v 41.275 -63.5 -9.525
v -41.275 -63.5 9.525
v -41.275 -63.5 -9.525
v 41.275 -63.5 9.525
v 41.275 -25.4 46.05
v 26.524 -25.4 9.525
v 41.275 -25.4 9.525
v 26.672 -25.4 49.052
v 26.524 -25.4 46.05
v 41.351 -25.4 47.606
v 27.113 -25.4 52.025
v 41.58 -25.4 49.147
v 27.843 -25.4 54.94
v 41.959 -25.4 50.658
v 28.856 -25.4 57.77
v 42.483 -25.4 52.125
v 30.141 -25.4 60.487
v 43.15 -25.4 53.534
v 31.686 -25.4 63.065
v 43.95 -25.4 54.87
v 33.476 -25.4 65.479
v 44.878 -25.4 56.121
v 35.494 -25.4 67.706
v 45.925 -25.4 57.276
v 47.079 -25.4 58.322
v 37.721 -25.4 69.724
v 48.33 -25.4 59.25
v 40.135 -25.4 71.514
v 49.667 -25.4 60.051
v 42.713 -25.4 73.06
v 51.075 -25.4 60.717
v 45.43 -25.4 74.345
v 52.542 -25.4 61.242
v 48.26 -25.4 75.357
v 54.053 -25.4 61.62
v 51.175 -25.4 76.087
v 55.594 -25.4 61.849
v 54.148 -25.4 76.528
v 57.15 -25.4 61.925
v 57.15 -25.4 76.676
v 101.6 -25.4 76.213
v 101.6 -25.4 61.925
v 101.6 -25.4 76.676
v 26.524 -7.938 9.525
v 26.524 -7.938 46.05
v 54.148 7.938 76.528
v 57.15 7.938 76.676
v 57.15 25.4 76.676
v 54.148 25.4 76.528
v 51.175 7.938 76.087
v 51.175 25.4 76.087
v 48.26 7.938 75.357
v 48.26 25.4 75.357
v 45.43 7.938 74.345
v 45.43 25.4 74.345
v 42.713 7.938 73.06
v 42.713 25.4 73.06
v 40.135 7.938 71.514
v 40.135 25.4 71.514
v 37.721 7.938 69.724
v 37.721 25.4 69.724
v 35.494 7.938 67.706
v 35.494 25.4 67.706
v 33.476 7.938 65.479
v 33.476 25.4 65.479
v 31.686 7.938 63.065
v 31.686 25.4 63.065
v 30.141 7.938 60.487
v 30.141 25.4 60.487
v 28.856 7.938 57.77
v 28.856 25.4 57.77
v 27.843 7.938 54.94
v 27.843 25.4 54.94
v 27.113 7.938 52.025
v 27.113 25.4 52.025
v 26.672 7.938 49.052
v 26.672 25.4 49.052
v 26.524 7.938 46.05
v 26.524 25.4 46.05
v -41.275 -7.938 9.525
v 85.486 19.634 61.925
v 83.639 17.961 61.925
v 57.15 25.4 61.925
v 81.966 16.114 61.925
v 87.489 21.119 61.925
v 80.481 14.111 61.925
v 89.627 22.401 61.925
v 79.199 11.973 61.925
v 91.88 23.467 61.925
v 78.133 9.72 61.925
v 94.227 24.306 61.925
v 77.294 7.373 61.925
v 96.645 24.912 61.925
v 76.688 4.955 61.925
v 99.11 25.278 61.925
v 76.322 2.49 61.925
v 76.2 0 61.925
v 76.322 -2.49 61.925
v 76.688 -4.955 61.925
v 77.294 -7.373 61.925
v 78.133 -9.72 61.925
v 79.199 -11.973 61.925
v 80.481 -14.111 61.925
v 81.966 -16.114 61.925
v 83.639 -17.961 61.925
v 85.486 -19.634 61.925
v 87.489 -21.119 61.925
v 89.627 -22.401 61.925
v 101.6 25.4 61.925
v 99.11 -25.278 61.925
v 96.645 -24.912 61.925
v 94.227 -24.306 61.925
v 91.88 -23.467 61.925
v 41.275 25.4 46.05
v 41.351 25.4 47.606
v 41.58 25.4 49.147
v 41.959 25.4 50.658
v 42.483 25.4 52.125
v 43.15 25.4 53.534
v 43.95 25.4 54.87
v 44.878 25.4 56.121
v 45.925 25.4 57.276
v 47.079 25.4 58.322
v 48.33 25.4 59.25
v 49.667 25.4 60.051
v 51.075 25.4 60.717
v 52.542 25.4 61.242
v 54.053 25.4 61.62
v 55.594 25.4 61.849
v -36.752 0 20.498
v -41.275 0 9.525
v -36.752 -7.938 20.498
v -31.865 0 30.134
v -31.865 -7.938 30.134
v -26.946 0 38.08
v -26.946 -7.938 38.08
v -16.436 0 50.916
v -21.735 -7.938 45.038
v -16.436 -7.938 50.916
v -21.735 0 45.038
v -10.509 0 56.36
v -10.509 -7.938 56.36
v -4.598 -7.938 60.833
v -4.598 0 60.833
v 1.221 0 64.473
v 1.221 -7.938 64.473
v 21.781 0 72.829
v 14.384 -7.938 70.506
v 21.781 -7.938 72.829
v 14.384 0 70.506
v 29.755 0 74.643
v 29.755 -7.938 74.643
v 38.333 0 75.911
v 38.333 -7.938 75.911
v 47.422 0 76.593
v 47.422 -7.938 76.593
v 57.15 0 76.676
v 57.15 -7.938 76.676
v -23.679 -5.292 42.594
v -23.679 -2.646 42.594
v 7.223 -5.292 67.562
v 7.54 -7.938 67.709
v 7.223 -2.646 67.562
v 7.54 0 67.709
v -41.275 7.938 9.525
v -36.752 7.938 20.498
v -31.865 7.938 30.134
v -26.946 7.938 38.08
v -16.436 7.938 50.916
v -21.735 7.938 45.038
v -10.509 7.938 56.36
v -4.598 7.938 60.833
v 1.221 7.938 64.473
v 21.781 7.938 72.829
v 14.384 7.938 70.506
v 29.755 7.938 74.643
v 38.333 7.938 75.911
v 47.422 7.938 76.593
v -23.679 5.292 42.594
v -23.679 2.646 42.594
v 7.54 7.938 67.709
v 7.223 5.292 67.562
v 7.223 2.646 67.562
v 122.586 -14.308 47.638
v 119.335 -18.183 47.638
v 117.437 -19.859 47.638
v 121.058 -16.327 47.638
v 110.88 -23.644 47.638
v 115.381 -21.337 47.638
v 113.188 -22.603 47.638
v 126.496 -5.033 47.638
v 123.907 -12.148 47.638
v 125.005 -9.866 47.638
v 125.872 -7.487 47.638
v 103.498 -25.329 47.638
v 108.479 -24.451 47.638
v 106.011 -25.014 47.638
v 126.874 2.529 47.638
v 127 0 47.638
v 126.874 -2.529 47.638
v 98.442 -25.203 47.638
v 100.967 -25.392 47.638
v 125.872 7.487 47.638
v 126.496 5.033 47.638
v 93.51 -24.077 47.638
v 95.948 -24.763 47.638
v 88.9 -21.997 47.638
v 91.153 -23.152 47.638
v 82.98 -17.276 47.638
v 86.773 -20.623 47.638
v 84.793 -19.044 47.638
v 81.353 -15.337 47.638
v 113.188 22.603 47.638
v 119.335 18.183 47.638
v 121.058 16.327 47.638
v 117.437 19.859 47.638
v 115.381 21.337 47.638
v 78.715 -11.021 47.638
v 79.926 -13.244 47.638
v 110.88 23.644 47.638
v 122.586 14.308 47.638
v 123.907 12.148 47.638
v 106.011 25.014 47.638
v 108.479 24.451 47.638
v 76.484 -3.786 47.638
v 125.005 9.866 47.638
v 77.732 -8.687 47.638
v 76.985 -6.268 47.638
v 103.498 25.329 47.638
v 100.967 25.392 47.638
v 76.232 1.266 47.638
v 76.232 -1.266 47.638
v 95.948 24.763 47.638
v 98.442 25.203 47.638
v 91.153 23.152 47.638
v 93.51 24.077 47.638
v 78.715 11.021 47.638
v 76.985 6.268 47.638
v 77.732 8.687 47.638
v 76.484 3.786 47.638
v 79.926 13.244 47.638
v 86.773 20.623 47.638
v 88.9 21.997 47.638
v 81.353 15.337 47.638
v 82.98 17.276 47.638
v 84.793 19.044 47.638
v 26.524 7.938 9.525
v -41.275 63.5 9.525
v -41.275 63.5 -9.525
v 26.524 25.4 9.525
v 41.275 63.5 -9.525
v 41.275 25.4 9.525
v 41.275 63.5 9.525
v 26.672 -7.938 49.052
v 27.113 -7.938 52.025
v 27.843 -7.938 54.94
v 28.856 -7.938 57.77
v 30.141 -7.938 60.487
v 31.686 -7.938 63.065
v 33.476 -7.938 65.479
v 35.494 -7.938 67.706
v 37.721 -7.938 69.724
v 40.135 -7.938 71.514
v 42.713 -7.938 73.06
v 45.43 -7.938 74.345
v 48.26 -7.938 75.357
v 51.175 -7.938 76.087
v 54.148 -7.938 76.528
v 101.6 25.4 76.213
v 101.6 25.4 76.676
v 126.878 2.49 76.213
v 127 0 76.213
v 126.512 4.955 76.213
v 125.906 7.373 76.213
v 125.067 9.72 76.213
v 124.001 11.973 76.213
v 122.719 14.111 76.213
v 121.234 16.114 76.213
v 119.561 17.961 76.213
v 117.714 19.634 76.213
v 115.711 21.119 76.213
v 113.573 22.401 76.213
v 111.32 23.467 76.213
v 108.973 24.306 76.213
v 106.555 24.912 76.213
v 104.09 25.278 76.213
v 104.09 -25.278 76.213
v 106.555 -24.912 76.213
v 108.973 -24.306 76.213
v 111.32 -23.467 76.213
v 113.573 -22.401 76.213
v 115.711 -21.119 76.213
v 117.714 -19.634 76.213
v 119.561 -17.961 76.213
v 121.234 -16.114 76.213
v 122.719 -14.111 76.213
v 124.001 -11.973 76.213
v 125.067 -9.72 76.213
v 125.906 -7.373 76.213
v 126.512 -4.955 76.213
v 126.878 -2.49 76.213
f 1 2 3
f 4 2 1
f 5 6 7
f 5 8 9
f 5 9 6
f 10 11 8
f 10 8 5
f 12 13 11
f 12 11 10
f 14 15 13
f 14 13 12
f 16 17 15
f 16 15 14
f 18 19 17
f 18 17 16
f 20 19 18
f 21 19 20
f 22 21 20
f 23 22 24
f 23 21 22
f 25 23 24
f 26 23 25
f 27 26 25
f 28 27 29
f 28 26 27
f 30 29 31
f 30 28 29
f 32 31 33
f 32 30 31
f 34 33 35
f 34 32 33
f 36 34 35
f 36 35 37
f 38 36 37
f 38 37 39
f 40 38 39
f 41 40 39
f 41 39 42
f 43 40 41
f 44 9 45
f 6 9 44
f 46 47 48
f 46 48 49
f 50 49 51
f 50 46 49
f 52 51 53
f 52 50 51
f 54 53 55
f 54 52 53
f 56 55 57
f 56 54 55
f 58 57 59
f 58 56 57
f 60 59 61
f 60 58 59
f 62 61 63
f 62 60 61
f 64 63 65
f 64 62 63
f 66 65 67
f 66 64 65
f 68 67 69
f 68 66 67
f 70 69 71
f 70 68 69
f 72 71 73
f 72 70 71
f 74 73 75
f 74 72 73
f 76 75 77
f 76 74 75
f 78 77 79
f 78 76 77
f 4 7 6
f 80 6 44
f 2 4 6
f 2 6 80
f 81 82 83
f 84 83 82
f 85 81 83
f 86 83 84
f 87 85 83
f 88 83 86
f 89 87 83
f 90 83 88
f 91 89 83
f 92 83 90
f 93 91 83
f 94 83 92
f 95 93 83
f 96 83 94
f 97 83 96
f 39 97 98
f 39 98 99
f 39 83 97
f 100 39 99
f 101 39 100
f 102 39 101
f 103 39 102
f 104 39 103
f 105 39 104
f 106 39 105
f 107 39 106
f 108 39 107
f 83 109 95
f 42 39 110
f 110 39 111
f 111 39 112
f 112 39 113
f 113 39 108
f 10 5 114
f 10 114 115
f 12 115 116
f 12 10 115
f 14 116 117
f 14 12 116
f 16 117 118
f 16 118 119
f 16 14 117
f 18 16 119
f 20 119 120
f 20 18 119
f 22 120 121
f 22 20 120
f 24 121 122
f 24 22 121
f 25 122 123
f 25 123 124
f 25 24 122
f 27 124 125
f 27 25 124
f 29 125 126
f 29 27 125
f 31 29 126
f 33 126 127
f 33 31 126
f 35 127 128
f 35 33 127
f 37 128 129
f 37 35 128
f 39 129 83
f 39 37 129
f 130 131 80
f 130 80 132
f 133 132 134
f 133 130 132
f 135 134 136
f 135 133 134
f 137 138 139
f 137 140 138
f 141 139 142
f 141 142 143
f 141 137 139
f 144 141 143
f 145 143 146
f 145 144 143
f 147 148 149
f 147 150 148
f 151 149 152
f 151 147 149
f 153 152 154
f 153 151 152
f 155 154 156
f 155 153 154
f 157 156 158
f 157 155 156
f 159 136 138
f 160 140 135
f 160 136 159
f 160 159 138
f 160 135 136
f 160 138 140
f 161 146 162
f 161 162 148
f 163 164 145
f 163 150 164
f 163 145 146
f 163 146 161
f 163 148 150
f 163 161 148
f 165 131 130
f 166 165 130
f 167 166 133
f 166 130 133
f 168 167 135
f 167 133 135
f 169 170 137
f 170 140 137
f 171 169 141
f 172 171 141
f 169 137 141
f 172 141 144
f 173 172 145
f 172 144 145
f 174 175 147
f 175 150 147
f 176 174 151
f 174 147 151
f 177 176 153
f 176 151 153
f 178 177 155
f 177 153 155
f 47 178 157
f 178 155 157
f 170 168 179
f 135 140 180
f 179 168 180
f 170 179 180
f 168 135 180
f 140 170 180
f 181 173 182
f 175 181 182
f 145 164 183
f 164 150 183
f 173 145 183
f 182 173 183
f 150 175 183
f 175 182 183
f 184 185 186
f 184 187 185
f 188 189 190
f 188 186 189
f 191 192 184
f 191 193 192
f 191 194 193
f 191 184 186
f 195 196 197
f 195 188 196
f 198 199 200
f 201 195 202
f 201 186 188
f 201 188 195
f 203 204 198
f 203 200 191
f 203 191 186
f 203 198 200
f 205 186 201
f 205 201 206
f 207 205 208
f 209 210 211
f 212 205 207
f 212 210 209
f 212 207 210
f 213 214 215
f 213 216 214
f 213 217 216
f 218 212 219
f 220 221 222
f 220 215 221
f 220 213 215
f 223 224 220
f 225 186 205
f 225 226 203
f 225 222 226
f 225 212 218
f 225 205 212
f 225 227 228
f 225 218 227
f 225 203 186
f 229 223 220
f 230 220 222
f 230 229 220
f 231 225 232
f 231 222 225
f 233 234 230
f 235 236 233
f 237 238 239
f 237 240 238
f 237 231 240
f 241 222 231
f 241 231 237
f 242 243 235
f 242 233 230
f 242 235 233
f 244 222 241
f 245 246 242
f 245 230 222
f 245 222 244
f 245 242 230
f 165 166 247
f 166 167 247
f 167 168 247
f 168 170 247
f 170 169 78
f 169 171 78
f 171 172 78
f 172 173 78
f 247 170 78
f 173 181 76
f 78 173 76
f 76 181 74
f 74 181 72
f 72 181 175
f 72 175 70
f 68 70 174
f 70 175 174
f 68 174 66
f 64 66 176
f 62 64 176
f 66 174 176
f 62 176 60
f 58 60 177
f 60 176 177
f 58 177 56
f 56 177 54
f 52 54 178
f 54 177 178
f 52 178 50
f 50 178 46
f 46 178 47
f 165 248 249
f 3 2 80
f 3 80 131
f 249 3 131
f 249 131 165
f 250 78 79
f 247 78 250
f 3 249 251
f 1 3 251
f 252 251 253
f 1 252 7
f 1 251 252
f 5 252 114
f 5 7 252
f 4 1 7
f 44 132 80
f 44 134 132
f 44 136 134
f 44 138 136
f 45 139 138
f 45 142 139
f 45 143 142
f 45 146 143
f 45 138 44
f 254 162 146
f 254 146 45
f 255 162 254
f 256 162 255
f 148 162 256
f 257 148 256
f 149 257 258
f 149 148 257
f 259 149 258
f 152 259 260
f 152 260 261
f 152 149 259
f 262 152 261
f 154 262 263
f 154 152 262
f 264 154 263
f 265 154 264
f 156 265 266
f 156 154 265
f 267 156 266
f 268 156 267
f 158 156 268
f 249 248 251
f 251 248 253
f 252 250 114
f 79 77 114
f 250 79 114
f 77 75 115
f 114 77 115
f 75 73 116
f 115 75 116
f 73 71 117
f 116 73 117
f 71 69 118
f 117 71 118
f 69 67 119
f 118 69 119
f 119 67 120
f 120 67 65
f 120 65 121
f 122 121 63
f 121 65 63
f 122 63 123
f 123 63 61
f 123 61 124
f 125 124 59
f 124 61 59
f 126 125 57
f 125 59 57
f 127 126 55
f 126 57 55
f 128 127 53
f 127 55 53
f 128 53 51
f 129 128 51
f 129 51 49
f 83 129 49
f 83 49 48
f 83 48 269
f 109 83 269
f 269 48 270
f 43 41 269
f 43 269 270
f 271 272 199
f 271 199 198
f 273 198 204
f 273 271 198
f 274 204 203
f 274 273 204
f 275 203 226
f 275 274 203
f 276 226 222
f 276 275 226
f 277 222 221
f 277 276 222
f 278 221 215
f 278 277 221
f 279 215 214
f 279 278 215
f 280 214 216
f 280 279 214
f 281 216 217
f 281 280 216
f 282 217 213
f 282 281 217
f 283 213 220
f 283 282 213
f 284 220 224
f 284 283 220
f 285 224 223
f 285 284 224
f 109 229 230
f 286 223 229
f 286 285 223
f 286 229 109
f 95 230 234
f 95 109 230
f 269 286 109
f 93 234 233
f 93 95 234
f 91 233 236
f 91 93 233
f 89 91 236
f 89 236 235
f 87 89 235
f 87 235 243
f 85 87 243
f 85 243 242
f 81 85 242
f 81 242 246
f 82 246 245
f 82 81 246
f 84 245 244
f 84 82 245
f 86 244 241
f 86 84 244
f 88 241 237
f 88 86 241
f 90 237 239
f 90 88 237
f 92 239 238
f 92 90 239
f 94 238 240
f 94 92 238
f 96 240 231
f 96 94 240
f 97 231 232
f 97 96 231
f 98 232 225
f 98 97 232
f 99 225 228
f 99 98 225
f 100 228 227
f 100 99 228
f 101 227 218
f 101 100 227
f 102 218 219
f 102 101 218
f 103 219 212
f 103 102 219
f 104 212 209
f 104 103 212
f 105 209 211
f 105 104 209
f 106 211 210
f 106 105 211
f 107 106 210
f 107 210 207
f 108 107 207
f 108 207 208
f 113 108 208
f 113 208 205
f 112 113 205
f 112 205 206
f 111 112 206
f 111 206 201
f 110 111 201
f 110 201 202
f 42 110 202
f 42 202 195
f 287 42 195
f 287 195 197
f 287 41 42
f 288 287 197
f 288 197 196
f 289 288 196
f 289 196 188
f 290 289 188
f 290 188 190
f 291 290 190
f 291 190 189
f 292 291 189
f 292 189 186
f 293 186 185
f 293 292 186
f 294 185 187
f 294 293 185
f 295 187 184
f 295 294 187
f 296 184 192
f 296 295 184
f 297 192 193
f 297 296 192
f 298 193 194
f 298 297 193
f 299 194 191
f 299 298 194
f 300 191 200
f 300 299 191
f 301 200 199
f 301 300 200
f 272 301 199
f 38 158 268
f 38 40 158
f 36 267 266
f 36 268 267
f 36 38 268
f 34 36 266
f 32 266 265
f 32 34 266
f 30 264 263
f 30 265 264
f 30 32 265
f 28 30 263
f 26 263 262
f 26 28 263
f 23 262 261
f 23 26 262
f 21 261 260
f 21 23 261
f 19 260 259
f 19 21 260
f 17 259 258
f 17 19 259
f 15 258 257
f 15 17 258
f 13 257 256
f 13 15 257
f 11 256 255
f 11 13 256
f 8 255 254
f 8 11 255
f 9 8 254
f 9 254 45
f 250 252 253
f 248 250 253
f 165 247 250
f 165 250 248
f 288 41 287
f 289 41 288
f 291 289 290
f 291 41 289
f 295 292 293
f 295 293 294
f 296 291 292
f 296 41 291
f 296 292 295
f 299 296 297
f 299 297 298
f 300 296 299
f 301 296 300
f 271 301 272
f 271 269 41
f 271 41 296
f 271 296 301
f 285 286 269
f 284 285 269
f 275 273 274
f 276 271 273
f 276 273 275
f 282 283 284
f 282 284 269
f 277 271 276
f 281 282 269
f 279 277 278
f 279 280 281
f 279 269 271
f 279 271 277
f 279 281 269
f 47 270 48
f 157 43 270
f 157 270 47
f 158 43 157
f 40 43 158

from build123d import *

# Parameters (mm, degrees)
F1_DEPTH = 63.5
F0_W     = 25.4
F0_H     = 14.2875
F2_DEPTH = 25.4
F3_DEPTH = 7.9375


with BuildPart() as f1:
    # F0 (on Front) → F1 (new body, symmetric)
    with BuildSketch(Plane.XZ):
        Polygon((41.275, -9.525), (41.275, 9.525), (26.524457, 9.525), (-41.275, 9.525), (-41.275, -9.525), align=None)
    extrude(amount=F1_DEPTH, both=True)

    # F0 (on Front) → F2 (join, symmetric)
    with BuildSketch(Plane.XZ):
        with BuildLine():
            Line((26.524457, 9.525), (41.275, 9.525))
            Line((41.275, 9.525), (41.275, 46.0502))
            ThreePointArc((41.275, 46.0502), (45.92468, 57.27552), (57.15, 61.9252))
            Line((57.15, 61.9252), (76.2, 61.9252))
            Line((76.2, 61.9252), (76.2, 76.2127))
            Line((76.2, 76.2127), (101.6, 76.2127))
            Line((101.6, 76.2127), (101.6, 76.675743))
            Line((101.6, 76.675743), (57.15, 76.675743))
            ThreePointArc((57.15, 76.675743), (35.494471, 67.705729), (26.524457, 46.0502))
            Line((26.524457, 46.0502), (26.524457, 9.525))
        make_face()
        with Locations((88.9, 69.06895)):
            Rectangle(F0_W, F0_H)
    extrude(amount=F2_DEPTH, both=True)

    # F0 (on Front) → F3 (join, symmetric)
    with BuildSketch(Plane.XZ):
        with BuildLine():
            Line((-41.275, 9.525), (26.524457, 9.525))
            Line((26.524457, 9.525), (26.524457, 46.0502))
            ThreePointArc((26.524457, 46.0502), (35.494471, 67.705729), (57.15, 76.675743))
            add(Edge.make_bspline(
                [(-41.275, 9.525), (-28.42545, 44.060338), (-4.196861, 78.073546), (57.15, 76.675743)],
                knots=[0, 0, 0, 0, 119.149918, 119.149918, 119.149918, 119.149918], degree=3))
        make_face()
    extrude(amount=F3_DEPTH, both=True)

    # F0 (on Front) → F4 (revolve)
    with BuildSketch(Plane.XZ):
        Polygon((101.6, 76.2127), (101.6, 61.9252), (101.6, 47.6377), (127, 47.6377), (127, 76.2127), align=None)
    revolve(axis=Axis((101.6, 0, 62.156721), (0, 0, 1)))


solid = f1.part
